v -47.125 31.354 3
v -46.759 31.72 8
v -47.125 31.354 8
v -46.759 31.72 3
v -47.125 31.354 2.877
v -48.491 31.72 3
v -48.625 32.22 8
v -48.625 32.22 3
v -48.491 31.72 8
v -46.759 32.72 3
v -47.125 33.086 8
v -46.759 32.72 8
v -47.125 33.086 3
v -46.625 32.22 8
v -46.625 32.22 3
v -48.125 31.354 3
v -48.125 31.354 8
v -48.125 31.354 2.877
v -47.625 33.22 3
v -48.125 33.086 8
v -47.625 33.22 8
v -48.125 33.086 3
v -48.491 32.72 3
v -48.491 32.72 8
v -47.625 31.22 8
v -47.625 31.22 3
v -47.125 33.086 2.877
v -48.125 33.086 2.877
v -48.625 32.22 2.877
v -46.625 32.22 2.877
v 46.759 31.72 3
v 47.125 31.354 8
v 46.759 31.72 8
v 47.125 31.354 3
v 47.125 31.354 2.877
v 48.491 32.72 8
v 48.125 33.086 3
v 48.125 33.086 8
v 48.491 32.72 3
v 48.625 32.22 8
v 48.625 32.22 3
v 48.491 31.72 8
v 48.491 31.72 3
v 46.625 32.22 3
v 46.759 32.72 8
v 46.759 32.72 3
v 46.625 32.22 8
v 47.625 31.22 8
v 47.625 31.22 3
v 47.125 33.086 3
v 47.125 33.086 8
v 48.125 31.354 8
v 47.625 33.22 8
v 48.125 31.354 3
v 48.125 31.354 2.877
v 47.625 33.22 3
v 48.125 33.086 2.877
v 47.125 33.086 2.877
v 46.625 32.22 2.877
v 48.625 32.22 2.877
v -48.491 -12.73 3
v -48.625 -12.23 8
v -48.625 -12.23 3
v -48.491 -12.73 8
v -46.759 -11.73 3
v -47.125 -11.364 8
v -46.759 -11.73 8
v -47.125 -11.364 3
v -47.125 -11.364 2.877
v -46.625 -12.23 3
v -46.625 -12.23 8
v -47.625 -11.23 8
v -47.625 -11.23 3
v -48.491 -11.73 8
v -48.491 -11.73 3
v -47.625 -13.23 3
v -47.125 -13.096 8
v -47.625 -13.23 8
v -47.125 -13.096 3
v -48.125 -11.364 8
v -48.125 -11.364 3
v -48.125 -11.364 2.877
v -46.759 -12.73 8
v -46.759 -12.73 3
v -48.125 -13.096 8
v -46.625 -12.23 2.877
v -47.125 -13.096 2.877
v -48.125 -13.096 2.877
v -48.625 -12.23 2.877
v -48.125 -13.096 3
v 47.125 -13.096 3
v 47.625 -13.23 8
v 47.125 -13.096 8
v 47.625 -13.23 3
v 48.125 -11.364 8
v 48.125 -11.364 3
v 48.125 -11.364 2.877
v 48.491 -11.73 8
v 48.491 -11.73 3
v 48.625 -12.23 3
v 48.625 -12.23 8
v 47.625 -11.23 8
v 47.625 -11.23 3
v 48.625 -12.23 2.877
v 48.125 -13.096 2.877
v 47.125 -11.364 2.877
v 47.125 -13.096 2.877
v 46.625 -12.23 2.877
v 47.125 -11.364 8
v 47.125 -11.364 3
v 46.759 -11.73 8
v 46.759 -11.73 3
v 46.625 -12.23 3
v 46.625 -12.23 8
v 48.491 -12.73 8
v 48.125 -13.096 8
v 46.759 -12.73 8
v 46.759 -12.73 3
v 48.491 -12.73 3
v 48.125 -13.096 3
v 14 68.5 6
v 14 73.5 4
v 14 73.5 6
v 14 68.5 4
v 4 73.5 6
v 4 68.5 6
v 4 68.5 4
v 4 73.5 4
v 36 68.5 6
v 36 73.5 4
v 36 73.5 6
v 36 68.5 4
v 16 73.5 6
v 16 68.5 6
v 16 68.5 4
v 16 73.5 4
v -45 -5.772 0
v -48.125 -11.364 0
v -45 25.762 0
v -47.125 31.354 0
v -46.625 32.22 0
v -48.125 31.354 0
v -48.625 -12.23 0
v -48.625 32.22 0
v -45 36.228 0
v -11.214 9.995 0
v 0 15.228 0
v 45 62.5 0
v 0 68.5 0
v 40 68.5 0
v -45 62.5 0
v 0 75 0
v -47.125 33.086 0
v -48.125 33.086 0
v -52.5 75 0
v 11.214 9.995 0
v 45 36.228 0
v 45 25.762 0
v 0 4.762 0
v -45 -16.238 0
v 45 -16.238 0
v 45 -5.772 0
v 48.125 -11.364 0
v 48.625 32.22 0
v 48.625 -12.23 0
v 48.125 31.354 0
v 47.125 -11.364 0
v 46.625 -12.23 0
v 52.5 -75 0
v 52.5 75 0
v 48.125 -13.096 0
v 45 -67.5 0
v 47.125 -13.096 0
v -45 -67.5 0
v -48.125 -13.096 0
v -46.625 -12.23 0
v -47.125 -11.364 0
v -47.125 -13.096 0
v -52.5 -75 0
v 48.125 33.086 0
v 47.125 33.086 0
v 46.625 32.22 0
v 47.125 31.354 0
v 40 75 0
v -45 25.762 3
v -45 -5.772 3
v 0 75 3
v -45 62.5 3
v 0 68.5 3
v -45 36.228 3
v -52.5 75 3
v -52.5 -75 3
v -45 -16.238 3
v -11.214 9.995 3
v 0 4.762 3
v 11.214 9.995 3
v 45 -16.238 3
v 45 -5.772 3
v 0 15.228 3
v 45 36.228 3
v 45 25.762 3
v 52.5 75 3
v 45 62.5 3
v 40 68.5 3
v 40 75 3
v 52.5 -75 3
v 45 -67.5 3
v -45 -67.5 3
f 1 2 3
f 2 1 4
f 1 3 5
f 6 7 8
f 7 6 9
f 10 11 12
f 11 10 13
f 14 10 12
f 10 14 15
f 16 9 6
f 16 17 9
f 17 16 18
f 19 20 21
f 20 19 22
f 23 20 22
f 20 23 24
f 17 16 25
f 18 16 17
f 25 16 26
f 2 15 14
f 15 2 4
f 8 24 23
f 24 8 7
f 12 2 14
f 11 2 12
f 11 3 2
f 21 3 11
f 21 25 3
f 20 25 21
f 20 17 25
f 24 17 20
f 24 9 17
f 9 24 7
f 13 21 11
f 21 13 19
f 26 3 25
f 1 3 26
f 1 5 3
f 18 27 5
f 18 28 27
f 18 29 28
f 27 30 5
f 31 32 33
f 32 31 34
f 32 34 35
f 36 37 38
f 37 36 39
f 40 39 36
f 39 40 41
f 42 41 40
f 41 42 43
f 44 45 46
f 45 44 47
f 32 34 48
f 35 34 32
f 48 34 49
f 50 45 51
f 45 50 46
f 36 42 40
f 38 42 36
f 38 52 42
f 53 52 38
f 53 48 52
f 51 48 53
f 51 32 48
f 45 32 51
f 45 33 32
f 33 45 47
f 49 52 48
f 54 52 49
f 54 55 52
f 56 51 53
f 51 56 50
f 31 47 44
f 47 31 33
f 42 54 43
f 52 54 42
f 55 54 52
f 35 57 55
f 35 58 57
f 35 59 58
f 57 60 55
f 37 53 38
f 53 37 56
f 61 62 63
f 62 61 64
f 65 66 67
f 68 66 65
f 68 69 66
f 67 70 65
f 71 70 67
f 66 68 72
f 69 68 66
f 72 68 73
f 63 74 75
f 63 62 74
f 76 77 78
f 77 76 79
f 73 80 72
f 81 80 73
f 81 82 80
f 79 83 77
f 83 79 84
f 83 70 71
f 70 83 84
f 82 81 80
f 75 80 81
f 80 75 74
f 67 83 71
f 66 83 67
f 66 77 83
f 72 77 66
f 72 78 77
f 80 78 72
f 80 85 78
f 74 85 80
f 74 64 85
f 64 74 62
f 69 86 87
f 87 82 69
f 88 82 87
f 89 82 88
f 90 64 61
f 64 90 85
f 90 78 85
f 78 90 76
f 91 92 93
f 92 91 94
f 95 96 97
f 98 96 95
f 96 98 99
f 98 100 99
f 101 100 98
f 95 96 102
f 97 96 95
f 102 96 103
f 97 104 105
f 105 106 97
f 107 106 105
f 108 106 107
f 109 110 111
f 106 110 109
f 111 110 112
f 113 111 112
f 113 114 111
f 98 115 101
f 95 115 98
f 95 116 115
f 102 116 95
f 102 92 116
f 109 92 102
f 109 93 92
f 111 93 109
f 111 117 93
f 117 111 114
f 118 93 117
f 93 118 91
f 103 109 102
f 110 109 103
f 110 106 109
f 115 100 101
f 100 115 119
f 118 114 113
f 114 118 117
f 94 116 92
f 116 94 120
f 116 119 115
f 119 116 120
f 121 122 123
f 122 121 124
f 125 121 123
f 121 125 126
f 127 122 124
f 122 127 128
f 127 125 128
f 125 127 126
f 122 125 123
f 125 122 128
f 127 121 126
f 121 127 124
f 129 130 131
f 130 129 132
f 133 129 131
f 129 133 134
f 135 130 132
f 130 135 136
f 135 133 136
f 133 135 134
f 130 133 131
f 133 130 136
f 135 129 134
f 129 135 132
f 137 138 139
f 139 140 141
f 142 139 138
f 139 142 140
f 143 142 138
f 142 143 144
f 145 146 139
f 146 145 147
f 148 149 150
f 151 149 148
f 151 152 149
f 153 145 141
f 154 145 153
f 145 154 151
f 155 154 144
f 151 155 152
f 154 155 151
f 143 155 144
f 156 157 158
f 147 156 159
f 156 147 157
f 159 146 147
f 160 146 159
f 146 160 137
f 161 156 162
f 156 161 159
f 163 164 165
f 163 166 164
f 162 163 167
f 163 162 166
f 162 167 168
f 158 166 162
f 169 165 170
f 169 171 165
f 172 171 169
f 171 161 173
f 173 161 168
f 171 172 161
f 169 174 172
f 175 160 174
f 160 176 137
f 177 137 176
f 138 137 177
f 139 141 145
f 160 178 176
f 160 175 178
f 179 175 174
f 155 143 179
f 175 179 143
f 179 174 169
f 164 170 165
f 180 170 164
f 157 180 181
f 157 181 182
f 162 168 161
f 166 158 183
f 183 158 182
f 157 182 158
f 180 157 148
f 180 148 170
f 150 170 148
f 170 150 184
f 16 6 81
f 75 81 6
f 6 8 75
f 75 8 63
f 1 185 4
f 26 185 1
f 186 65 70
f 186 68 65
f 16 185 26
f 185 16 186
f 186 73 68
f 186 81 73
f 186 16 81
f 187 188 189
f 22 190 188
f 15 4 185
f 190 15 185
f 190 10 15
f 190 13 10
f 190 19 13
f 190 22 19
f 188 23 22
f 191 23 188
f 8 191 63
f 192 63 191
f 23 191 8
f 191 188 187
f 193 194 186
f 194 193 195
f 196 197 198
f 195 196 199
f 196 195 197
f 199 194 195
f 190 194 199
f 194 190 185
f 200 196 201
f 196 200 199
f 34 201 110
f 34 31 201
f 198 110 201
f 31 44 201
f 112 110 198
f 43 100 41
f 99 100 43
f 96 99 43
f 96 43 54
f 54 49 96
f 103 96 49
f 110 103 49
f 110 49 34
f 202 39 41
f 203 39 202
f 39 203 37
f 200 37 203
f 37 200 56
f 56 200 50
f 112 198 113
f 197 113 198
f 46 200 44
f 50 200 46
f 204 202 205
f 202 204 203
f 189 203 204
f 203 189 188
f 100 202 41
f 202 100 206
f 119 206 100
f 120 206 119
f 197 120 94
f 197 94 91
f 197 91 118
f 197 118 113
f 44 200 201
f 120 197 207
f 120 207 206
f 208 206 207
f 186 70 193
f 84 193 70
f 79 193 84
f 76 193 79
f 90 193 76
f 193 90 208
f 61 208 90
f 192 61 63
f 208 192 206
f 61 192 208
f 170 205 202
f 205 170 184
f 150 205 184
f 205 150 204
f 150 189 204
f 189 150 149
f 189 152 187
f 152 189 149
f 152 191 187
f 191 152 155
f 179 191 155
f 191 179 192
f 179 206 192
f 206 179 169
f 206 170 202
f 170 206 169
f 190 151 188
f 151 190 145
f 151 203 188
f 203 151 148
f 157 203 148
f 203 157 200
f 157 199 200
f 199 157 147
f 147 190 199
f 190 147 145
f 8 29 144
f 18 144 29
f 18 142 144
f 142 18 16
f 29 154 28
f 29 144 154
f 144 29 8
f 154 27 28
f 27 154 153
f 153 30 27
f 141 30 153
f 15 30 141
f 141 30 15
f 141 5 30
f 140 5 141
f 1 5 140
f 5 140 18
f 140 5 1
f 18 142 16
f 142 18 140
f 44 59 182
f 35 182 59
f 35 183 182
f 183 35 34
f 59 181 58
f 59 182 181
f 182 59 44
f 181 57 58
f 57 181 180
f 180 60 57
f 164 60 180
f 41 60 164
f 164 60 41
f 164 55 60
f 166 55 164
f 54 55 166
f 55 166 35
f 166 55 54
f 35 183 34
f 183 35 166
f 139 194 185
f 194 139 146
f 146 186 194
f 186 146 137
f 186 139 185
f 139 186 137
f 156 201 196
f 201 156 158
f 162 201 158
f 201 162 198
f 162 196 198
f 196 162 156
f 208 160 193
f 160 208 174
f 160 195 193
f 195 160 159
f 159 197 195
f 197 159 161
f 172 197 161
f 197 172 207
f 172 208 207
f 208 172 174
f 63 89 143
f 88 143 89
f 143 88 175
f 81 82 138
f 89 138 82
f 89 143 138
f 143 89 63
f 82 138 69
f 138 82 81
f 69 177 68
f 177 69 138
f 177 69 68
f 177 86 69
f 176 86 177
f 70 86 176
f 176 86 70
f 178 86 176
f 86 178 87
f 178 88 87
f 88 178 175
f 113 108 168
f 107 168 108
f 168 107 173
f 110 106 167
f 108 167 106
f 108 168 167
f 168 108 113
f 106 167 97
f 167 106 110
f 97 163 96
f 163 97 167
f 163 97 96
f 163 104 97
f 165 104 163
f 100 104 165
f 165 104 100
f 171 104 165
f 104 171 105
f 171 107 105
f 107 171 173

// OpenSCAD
module Disk(ghost=false, body=true) {
    width = 101.61;
    length = 147;
    height = 20;
    screw_x = width / 2 - 3.18;
    screw_y1 = length / 2 - 41.28;
    screw_y2 = screw_y1 - 44.45;
    screw_radius = 1;
    screw_height = 5;
    overlap = 0.123456789;

    screws = [
        [-screw_x, screw_y1], [screw_x, screw_y1],
        [-screw_x, screw_y2], [screw_x, screw_y2],
    ];

    module Body() {
        difference() {
            translate([-width / 2, -length / 2, 0])
                cube([width, length, height]);
            for (i = [0 : 3]) {
                translate([screws[i][0], screws[i][1], -overlap])
                    cylinder(r=screw_radius, h=screw_height + overlap, $fn=6);
            }
            translate([0, length / 2 - 5, -overlap])
                cube([40, 5 + overlap, 5 + overlap]);
        }
    }

    if (ghost) {
        if (body) %Body();
        for (i = [0 : 3]) {
            translate([screws[i][0], screws[i][1], -overlap])
                cylinder(r=screw_radius, h=screw_height + overlap, $fn=12);
        }
    } else {
        Body();
    }
    translate([4, length / 2 - 5, 1])
        cube([10, 5, 2]);
    translate([16, length / 2 - 5, 1])
        cube([20, 5, 2]);
}

module DiskPlate() {
    disk_width = 101.61;
    disk_length = 147;
    screw_x = disk_width / 2 - 3.18;
    screw_y1 = disk_length / 2 - 41.28;
    screw_y2 = screw_y1 - 44.45;
    screw_radius = 1;
    screw_height = 5;
    outer_width = 105;
    outer_length = 150;
    inner_width = 90;
    inner_length = 130;
    inner_y_offset = -2.5;
    cross_size = 10;
    overlap = 0.123456789;

    screws = [
        [-screw_x, screw_y1], [screw_x, screw_y1],
        [-screw_x, screw_y2], [screw_x, screw_y2],
    ];
    
    difference() {
        union() {
            difference() {
                square([outer_width, outer_length], center=true);
                translate([0, inner_y_offset, 0])
                    square([inner_width, inner_length], center=true);
            }
            for (i = [0 : 1]) {
                hull() {
                    translate([screws[i][0], screws[i][1], -overlap])
                        square([1, cross_size], center=true);
                    translate([screws[3 - i][0], screws[3 - i][1], -overlap])
                        square([1, cross_size], center=true);
                }
            }
        }
        for (i = [0 : 3]) {
            translate([screws[i][0], screws[i][1], -overlap])
                circle(r=screw_radius, $fn=6);
        }
        translate([0, disk_length / 2 - 5, 0])
            square([40, 10]);
    }
}

translate([0, 0, 3]) Disk(ghost=true);
linear_extrude(height=3) DiskPlate();
